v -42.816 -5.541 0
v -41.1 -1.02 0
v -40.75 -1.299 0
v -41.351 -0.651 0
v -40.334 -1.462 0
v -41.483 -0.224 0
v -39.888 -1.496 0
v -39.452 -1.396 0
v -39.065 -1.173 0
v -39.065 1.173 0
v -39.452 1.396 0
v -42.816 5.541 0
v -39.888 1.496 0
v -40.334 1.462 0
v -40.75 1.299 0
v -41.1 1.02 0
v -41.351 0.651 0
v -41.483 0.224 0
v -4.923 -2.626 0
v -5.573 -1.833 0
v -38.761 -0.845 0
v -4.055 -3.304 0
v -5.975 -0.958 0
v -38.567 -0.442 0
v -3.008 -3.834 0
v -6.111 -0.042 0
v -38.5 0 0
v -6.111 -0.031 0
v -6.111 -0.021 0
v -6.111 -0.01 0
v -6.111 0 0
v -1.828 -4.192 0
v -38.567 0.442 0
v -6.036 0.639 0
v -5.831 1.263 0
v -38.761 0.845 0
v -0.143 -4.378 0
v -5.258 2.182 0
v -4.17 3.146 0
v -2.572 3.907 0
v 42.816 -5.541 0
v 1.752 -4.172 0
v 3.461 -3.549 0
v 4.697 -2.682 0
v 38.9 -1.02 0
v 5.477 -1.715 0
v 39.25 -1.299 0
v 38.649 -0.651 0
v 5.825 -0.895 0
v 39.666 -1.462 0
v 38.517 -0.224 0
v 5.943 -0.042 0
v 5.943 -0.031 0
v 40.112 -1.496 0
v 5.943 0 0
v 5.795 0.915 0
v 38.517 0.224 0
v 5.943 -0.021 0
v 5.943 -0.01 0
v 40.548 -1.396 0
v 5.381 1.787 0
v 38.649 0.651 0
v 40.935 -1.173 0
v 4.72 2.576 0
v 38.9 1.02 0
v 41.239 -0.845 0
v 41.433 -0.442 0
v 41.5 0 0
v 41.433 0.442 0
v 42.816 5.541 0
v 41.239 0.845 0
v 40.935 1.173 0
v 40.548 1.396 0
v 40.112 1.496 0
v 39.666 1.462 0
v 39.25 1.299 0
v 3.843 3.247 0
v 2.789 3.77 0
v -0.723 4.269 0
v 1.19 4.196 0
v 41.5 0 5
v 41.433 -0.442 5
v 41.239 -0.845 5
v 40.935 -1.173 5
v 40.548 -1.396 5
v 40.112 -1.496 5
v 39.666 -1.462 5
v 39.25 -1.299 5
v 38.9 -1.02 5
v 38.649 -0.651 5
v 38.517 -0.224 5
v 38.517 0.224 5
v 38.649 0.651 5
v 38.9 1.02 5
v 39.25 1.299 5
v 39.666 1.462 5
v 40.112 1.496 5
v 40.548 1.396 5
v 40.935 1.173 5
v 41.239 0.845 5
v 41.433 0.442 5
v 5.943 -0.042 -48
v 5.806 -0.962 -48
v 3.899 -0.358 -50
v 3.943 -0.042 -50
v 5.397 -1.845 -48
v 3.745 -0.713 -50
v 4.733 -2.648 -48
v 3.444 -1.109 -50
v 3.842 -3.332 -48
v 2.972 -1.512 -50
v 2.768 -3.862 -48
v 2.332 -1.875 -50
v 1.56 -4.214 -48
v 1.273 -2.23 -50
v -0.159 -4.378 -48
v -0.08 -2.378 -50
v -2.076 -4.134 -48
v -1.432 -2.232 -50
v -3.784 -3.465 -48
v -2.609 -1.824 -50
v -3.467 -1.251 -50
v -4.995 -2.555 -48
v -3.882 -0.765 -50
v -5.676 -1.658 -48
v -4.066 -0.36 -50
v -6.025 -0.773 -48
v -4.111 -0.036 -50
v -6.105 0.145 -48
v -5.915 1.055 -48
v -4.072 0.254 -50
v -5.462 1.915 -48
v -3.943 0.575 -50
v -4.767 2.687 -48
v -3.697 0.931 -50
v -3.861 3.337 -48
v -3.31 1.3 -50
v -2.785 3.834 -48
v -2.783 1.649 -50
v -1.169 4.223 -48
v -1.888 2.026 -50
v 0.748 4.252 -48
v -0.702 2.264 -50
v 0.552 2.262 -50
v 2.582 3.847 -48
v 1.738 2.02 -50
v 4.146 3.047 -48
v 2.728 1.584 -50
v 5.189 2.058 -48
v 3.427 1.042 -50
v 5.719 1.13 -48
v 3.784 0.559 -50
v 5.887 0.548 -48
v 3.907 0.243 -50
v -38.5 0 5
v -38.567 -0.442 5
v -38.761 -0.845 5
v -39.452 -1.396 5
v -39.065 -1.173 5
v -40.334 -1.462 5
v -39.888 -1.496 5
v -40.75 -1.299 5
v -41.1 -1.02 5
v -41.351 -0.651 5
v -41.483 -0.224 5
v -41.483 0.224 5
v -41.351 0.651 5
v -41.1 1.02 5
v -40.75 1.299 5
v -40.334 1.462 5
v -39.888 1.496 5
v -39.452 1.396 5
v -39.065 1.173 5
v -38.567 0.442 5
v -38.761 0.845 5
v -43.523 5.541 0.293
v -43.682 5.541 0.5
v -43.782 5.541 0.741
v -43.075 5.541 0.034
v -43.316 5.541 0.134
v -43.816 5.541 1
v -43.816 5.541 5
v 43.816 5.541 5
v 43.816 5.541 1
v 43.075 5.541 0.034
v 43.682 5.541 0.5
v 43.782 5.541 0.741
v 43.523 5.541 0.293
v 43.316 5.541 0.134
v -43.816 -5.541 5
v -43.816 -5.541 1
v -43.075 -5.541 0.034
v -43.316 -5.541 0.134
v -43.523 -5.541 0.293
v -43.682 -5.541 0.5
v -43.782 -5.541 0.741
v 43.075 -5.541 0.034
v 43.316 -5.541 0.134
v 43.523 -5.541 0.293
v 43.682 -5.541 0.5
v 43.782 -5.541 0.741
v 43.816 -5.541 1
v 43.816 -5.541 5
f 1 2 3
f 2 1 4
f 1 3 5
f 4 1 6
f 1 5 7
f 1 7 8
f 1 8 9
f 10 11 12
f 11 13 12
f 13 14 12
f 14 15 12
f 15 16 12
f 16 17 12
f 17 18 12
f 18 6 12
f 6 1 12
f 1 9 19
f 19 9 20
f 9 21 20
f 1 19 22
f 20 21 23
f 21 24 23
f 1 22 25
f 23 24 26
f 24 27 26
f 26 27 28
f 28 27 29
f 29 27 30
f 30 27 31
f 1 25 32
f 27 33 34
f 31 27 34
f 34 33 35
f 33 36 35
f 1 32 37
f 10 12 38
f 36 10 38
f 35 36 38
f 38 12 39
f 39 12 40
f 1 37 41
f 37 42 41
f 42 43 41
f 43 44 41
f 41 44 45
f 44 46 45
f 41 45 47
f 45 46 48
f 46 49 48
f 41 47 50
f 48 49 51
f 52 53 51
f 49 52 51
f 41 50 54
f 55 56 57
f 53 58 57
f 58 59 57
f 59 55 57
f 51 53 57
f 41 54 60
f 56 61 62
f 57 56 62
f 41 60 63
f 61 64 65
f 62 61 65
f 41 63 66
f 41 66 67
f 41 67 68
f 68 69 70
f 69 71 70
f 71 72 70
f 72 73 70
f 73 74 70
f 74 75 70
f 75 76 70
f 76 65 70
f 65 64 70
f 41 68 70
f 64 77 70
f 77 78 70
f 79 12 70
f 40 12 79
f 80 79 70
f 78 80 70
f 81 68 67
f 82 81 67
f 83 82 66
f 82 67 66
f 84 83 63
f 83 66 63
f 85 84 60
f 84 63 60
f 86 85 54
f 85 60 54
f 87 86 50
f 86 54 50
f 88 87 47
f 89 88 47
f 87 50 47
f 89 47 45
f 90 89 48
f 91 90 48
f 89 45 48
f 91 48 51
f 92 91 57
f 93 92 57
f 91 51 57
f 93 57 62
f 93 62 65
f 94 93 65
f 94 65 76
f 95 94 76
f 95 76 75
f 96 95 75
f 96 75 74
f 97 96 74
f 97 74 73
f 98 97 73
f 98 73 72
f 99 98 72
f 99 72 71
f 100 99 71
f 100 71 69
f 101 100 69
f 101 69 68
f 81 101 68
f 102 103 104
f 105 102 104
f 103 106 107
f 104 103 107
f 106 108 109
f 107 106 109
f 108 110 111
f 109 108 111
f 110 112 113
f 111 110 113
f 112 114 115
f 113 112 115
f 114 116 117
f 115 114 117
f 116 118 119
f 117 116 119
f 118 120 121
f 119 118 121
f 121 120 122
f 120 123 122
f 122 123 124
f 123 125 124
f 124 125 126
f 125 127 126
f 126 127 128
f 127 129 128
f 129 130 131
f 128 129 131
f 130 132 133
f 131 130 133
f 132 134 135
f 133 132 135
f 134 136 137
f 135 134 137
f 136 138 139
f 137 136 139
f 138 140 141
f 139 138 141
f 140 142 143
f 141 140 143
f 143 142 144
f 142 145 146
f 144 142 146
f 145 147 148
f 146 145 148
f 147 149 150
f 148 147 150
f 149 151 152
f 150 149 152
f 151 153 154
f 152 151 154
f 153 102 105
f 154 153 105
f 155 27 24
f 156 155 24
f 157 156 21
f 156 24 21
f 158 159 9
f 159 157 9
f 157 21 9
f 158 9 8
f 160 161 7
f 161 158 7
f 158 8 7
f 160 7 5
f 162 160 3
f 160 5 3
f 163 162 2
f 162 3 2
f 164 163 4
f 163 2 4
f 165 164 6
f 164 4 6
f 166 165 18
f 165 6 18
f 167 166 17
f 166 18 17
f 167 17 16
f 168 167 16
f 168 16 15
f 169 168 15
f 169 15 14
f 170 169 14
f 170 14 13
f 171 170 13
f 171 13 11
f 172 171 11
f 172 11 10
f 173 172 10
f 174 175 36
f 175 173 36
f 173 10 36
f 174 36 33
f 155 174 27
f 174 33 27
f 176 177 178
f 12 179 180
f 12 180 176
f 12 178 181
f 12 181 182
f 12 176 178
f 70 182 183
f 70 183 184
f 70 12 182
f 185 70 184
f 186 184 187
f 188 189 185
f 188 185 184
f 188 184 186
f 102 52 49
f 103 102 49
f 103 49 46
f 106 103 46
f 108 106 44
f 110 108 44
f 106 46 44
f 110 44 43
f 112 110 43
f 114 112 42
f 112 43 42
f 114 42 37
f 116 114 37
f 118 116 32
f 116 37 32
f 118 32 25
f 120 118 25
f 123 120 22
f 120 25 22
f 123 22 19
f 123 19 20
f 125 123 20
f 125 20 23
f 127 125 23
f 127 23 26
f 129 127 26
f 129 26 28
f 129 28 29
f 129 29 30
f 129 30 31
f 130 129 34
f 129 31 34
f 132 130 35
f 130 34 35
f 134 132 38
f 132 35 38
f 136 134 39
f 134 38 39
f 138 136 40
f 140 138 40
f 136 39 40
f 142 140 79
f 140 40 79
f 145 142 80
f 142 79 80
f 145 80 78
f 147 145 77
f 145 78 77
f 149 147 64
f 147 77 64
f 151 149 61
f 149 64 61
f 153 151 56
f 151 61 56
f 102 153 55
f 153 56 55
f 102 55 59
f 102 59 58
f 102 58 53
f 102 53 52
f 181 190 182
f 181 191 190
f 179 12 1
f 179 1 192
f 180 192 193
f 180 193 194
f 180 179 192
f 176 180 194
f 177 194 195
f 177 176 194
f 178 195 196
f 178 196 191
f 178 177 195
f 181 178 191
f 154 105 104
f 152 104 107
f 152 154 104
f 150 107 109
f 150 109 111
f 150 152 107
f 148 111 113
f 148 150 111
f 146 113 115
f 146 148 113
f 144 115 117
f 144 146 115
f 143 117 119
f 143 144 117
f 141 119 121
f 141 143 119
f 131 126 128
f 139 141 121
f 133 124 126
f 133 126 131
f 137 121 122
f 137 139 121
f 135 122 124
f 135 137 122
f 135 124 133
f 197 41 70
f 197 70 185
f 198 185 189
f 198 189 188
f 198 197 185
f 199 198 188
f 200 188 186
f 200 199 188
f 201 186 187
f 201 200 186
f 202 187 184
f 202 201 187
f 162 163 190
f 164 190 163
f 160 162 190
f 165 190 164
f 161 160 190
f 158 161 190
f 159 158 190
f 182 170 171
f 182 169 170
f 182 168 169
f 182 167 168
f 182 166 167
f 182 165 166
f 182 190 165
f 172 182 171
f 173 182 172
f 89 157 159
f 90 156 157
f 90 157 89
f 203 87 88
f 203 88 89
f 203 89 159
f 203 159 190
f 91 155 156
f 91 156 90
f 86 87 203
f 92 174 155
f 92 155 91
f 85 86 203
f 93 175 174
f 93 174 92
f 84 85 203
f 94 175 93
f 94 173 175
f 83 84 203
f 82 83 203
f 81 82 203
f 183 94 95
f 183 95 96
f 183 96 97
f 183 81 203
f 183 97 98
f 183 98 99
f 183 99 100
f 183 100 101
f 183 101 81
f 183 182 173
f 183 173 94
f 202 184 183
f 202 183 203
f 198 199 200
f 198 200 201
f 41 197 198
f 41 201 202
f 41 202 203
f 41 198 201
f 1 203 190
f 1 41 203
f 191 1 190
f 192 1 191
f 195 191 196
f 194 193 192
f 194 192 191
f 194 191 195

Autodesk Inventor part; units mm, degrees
ref_plane "YZ Plane" through (0, 0, 0) normal (1, 0, 0) x (0, 1, 0)
ref_plane "XZ Plane" through (0, 0, 0) normal (0, 1, 0) x (-1, 0, 0)
ref_plane "XY Plane" through (0, 0, 0) normal (0, 0, 1) x (1, 0, 0)
sketch "Sketch1" plane through (0, 0, 0) normal (0, 0, 1) x (1, 0, 0)
  line L0 (-40, 0) -> (40, 0)
  circle A0 centre (-40, 0) radius 1.5
  circle A1 centre (40, 0) radius 1.5
  line L1 (-43.8161, 5.5412) -> (43.8161, 5.5412)
  line L2 (43.8161, 5.5412) -> (43.8161, -5.5412)
  line L3 (43.8161, -5.5412) -> (-43.8161, -5.5412)
  line L4 (-43.8161, -5.5412) -> (-43.8161, 5.5412)
  ellipse E0 centre (-0.0839, -0.042) end of major axis (-6.111, -0.042) minor radius 4.3359
  point P0 (0, 0)
  point P1 (0, 0)
  point P2 (0, -5.5412)
  point P3 (-43.8161, 0)
  point P4 (43.8161, 0)
extrude "Extrusion2" add sketch "Sketch1" along normal blind 5
sketch "Sketch4" plane through (0, 0, 0) normal (0, 0, -1) x (-1, 0, 0)
  ellipse E0 centre (0.0839, -0.042) end of major axis (-5.9431, -0.042) minor radius 4.3359 projected
  point P0 (0, 0)
extrude "Extrusion3" add sketch "Sketch4" along normal blind 50 and the other way blind 5
chamfer "Chamfer1" distance 2 angle 45 1 edges at (-6.111, -0.042, -50)
fillet "Fillet1" radius 1 1 edges at (-43.8161, 0, 0)
fillet "Fillet2" radius 1 1 edges at (43.8161, 0, 0)
properties part number "apoioG"
